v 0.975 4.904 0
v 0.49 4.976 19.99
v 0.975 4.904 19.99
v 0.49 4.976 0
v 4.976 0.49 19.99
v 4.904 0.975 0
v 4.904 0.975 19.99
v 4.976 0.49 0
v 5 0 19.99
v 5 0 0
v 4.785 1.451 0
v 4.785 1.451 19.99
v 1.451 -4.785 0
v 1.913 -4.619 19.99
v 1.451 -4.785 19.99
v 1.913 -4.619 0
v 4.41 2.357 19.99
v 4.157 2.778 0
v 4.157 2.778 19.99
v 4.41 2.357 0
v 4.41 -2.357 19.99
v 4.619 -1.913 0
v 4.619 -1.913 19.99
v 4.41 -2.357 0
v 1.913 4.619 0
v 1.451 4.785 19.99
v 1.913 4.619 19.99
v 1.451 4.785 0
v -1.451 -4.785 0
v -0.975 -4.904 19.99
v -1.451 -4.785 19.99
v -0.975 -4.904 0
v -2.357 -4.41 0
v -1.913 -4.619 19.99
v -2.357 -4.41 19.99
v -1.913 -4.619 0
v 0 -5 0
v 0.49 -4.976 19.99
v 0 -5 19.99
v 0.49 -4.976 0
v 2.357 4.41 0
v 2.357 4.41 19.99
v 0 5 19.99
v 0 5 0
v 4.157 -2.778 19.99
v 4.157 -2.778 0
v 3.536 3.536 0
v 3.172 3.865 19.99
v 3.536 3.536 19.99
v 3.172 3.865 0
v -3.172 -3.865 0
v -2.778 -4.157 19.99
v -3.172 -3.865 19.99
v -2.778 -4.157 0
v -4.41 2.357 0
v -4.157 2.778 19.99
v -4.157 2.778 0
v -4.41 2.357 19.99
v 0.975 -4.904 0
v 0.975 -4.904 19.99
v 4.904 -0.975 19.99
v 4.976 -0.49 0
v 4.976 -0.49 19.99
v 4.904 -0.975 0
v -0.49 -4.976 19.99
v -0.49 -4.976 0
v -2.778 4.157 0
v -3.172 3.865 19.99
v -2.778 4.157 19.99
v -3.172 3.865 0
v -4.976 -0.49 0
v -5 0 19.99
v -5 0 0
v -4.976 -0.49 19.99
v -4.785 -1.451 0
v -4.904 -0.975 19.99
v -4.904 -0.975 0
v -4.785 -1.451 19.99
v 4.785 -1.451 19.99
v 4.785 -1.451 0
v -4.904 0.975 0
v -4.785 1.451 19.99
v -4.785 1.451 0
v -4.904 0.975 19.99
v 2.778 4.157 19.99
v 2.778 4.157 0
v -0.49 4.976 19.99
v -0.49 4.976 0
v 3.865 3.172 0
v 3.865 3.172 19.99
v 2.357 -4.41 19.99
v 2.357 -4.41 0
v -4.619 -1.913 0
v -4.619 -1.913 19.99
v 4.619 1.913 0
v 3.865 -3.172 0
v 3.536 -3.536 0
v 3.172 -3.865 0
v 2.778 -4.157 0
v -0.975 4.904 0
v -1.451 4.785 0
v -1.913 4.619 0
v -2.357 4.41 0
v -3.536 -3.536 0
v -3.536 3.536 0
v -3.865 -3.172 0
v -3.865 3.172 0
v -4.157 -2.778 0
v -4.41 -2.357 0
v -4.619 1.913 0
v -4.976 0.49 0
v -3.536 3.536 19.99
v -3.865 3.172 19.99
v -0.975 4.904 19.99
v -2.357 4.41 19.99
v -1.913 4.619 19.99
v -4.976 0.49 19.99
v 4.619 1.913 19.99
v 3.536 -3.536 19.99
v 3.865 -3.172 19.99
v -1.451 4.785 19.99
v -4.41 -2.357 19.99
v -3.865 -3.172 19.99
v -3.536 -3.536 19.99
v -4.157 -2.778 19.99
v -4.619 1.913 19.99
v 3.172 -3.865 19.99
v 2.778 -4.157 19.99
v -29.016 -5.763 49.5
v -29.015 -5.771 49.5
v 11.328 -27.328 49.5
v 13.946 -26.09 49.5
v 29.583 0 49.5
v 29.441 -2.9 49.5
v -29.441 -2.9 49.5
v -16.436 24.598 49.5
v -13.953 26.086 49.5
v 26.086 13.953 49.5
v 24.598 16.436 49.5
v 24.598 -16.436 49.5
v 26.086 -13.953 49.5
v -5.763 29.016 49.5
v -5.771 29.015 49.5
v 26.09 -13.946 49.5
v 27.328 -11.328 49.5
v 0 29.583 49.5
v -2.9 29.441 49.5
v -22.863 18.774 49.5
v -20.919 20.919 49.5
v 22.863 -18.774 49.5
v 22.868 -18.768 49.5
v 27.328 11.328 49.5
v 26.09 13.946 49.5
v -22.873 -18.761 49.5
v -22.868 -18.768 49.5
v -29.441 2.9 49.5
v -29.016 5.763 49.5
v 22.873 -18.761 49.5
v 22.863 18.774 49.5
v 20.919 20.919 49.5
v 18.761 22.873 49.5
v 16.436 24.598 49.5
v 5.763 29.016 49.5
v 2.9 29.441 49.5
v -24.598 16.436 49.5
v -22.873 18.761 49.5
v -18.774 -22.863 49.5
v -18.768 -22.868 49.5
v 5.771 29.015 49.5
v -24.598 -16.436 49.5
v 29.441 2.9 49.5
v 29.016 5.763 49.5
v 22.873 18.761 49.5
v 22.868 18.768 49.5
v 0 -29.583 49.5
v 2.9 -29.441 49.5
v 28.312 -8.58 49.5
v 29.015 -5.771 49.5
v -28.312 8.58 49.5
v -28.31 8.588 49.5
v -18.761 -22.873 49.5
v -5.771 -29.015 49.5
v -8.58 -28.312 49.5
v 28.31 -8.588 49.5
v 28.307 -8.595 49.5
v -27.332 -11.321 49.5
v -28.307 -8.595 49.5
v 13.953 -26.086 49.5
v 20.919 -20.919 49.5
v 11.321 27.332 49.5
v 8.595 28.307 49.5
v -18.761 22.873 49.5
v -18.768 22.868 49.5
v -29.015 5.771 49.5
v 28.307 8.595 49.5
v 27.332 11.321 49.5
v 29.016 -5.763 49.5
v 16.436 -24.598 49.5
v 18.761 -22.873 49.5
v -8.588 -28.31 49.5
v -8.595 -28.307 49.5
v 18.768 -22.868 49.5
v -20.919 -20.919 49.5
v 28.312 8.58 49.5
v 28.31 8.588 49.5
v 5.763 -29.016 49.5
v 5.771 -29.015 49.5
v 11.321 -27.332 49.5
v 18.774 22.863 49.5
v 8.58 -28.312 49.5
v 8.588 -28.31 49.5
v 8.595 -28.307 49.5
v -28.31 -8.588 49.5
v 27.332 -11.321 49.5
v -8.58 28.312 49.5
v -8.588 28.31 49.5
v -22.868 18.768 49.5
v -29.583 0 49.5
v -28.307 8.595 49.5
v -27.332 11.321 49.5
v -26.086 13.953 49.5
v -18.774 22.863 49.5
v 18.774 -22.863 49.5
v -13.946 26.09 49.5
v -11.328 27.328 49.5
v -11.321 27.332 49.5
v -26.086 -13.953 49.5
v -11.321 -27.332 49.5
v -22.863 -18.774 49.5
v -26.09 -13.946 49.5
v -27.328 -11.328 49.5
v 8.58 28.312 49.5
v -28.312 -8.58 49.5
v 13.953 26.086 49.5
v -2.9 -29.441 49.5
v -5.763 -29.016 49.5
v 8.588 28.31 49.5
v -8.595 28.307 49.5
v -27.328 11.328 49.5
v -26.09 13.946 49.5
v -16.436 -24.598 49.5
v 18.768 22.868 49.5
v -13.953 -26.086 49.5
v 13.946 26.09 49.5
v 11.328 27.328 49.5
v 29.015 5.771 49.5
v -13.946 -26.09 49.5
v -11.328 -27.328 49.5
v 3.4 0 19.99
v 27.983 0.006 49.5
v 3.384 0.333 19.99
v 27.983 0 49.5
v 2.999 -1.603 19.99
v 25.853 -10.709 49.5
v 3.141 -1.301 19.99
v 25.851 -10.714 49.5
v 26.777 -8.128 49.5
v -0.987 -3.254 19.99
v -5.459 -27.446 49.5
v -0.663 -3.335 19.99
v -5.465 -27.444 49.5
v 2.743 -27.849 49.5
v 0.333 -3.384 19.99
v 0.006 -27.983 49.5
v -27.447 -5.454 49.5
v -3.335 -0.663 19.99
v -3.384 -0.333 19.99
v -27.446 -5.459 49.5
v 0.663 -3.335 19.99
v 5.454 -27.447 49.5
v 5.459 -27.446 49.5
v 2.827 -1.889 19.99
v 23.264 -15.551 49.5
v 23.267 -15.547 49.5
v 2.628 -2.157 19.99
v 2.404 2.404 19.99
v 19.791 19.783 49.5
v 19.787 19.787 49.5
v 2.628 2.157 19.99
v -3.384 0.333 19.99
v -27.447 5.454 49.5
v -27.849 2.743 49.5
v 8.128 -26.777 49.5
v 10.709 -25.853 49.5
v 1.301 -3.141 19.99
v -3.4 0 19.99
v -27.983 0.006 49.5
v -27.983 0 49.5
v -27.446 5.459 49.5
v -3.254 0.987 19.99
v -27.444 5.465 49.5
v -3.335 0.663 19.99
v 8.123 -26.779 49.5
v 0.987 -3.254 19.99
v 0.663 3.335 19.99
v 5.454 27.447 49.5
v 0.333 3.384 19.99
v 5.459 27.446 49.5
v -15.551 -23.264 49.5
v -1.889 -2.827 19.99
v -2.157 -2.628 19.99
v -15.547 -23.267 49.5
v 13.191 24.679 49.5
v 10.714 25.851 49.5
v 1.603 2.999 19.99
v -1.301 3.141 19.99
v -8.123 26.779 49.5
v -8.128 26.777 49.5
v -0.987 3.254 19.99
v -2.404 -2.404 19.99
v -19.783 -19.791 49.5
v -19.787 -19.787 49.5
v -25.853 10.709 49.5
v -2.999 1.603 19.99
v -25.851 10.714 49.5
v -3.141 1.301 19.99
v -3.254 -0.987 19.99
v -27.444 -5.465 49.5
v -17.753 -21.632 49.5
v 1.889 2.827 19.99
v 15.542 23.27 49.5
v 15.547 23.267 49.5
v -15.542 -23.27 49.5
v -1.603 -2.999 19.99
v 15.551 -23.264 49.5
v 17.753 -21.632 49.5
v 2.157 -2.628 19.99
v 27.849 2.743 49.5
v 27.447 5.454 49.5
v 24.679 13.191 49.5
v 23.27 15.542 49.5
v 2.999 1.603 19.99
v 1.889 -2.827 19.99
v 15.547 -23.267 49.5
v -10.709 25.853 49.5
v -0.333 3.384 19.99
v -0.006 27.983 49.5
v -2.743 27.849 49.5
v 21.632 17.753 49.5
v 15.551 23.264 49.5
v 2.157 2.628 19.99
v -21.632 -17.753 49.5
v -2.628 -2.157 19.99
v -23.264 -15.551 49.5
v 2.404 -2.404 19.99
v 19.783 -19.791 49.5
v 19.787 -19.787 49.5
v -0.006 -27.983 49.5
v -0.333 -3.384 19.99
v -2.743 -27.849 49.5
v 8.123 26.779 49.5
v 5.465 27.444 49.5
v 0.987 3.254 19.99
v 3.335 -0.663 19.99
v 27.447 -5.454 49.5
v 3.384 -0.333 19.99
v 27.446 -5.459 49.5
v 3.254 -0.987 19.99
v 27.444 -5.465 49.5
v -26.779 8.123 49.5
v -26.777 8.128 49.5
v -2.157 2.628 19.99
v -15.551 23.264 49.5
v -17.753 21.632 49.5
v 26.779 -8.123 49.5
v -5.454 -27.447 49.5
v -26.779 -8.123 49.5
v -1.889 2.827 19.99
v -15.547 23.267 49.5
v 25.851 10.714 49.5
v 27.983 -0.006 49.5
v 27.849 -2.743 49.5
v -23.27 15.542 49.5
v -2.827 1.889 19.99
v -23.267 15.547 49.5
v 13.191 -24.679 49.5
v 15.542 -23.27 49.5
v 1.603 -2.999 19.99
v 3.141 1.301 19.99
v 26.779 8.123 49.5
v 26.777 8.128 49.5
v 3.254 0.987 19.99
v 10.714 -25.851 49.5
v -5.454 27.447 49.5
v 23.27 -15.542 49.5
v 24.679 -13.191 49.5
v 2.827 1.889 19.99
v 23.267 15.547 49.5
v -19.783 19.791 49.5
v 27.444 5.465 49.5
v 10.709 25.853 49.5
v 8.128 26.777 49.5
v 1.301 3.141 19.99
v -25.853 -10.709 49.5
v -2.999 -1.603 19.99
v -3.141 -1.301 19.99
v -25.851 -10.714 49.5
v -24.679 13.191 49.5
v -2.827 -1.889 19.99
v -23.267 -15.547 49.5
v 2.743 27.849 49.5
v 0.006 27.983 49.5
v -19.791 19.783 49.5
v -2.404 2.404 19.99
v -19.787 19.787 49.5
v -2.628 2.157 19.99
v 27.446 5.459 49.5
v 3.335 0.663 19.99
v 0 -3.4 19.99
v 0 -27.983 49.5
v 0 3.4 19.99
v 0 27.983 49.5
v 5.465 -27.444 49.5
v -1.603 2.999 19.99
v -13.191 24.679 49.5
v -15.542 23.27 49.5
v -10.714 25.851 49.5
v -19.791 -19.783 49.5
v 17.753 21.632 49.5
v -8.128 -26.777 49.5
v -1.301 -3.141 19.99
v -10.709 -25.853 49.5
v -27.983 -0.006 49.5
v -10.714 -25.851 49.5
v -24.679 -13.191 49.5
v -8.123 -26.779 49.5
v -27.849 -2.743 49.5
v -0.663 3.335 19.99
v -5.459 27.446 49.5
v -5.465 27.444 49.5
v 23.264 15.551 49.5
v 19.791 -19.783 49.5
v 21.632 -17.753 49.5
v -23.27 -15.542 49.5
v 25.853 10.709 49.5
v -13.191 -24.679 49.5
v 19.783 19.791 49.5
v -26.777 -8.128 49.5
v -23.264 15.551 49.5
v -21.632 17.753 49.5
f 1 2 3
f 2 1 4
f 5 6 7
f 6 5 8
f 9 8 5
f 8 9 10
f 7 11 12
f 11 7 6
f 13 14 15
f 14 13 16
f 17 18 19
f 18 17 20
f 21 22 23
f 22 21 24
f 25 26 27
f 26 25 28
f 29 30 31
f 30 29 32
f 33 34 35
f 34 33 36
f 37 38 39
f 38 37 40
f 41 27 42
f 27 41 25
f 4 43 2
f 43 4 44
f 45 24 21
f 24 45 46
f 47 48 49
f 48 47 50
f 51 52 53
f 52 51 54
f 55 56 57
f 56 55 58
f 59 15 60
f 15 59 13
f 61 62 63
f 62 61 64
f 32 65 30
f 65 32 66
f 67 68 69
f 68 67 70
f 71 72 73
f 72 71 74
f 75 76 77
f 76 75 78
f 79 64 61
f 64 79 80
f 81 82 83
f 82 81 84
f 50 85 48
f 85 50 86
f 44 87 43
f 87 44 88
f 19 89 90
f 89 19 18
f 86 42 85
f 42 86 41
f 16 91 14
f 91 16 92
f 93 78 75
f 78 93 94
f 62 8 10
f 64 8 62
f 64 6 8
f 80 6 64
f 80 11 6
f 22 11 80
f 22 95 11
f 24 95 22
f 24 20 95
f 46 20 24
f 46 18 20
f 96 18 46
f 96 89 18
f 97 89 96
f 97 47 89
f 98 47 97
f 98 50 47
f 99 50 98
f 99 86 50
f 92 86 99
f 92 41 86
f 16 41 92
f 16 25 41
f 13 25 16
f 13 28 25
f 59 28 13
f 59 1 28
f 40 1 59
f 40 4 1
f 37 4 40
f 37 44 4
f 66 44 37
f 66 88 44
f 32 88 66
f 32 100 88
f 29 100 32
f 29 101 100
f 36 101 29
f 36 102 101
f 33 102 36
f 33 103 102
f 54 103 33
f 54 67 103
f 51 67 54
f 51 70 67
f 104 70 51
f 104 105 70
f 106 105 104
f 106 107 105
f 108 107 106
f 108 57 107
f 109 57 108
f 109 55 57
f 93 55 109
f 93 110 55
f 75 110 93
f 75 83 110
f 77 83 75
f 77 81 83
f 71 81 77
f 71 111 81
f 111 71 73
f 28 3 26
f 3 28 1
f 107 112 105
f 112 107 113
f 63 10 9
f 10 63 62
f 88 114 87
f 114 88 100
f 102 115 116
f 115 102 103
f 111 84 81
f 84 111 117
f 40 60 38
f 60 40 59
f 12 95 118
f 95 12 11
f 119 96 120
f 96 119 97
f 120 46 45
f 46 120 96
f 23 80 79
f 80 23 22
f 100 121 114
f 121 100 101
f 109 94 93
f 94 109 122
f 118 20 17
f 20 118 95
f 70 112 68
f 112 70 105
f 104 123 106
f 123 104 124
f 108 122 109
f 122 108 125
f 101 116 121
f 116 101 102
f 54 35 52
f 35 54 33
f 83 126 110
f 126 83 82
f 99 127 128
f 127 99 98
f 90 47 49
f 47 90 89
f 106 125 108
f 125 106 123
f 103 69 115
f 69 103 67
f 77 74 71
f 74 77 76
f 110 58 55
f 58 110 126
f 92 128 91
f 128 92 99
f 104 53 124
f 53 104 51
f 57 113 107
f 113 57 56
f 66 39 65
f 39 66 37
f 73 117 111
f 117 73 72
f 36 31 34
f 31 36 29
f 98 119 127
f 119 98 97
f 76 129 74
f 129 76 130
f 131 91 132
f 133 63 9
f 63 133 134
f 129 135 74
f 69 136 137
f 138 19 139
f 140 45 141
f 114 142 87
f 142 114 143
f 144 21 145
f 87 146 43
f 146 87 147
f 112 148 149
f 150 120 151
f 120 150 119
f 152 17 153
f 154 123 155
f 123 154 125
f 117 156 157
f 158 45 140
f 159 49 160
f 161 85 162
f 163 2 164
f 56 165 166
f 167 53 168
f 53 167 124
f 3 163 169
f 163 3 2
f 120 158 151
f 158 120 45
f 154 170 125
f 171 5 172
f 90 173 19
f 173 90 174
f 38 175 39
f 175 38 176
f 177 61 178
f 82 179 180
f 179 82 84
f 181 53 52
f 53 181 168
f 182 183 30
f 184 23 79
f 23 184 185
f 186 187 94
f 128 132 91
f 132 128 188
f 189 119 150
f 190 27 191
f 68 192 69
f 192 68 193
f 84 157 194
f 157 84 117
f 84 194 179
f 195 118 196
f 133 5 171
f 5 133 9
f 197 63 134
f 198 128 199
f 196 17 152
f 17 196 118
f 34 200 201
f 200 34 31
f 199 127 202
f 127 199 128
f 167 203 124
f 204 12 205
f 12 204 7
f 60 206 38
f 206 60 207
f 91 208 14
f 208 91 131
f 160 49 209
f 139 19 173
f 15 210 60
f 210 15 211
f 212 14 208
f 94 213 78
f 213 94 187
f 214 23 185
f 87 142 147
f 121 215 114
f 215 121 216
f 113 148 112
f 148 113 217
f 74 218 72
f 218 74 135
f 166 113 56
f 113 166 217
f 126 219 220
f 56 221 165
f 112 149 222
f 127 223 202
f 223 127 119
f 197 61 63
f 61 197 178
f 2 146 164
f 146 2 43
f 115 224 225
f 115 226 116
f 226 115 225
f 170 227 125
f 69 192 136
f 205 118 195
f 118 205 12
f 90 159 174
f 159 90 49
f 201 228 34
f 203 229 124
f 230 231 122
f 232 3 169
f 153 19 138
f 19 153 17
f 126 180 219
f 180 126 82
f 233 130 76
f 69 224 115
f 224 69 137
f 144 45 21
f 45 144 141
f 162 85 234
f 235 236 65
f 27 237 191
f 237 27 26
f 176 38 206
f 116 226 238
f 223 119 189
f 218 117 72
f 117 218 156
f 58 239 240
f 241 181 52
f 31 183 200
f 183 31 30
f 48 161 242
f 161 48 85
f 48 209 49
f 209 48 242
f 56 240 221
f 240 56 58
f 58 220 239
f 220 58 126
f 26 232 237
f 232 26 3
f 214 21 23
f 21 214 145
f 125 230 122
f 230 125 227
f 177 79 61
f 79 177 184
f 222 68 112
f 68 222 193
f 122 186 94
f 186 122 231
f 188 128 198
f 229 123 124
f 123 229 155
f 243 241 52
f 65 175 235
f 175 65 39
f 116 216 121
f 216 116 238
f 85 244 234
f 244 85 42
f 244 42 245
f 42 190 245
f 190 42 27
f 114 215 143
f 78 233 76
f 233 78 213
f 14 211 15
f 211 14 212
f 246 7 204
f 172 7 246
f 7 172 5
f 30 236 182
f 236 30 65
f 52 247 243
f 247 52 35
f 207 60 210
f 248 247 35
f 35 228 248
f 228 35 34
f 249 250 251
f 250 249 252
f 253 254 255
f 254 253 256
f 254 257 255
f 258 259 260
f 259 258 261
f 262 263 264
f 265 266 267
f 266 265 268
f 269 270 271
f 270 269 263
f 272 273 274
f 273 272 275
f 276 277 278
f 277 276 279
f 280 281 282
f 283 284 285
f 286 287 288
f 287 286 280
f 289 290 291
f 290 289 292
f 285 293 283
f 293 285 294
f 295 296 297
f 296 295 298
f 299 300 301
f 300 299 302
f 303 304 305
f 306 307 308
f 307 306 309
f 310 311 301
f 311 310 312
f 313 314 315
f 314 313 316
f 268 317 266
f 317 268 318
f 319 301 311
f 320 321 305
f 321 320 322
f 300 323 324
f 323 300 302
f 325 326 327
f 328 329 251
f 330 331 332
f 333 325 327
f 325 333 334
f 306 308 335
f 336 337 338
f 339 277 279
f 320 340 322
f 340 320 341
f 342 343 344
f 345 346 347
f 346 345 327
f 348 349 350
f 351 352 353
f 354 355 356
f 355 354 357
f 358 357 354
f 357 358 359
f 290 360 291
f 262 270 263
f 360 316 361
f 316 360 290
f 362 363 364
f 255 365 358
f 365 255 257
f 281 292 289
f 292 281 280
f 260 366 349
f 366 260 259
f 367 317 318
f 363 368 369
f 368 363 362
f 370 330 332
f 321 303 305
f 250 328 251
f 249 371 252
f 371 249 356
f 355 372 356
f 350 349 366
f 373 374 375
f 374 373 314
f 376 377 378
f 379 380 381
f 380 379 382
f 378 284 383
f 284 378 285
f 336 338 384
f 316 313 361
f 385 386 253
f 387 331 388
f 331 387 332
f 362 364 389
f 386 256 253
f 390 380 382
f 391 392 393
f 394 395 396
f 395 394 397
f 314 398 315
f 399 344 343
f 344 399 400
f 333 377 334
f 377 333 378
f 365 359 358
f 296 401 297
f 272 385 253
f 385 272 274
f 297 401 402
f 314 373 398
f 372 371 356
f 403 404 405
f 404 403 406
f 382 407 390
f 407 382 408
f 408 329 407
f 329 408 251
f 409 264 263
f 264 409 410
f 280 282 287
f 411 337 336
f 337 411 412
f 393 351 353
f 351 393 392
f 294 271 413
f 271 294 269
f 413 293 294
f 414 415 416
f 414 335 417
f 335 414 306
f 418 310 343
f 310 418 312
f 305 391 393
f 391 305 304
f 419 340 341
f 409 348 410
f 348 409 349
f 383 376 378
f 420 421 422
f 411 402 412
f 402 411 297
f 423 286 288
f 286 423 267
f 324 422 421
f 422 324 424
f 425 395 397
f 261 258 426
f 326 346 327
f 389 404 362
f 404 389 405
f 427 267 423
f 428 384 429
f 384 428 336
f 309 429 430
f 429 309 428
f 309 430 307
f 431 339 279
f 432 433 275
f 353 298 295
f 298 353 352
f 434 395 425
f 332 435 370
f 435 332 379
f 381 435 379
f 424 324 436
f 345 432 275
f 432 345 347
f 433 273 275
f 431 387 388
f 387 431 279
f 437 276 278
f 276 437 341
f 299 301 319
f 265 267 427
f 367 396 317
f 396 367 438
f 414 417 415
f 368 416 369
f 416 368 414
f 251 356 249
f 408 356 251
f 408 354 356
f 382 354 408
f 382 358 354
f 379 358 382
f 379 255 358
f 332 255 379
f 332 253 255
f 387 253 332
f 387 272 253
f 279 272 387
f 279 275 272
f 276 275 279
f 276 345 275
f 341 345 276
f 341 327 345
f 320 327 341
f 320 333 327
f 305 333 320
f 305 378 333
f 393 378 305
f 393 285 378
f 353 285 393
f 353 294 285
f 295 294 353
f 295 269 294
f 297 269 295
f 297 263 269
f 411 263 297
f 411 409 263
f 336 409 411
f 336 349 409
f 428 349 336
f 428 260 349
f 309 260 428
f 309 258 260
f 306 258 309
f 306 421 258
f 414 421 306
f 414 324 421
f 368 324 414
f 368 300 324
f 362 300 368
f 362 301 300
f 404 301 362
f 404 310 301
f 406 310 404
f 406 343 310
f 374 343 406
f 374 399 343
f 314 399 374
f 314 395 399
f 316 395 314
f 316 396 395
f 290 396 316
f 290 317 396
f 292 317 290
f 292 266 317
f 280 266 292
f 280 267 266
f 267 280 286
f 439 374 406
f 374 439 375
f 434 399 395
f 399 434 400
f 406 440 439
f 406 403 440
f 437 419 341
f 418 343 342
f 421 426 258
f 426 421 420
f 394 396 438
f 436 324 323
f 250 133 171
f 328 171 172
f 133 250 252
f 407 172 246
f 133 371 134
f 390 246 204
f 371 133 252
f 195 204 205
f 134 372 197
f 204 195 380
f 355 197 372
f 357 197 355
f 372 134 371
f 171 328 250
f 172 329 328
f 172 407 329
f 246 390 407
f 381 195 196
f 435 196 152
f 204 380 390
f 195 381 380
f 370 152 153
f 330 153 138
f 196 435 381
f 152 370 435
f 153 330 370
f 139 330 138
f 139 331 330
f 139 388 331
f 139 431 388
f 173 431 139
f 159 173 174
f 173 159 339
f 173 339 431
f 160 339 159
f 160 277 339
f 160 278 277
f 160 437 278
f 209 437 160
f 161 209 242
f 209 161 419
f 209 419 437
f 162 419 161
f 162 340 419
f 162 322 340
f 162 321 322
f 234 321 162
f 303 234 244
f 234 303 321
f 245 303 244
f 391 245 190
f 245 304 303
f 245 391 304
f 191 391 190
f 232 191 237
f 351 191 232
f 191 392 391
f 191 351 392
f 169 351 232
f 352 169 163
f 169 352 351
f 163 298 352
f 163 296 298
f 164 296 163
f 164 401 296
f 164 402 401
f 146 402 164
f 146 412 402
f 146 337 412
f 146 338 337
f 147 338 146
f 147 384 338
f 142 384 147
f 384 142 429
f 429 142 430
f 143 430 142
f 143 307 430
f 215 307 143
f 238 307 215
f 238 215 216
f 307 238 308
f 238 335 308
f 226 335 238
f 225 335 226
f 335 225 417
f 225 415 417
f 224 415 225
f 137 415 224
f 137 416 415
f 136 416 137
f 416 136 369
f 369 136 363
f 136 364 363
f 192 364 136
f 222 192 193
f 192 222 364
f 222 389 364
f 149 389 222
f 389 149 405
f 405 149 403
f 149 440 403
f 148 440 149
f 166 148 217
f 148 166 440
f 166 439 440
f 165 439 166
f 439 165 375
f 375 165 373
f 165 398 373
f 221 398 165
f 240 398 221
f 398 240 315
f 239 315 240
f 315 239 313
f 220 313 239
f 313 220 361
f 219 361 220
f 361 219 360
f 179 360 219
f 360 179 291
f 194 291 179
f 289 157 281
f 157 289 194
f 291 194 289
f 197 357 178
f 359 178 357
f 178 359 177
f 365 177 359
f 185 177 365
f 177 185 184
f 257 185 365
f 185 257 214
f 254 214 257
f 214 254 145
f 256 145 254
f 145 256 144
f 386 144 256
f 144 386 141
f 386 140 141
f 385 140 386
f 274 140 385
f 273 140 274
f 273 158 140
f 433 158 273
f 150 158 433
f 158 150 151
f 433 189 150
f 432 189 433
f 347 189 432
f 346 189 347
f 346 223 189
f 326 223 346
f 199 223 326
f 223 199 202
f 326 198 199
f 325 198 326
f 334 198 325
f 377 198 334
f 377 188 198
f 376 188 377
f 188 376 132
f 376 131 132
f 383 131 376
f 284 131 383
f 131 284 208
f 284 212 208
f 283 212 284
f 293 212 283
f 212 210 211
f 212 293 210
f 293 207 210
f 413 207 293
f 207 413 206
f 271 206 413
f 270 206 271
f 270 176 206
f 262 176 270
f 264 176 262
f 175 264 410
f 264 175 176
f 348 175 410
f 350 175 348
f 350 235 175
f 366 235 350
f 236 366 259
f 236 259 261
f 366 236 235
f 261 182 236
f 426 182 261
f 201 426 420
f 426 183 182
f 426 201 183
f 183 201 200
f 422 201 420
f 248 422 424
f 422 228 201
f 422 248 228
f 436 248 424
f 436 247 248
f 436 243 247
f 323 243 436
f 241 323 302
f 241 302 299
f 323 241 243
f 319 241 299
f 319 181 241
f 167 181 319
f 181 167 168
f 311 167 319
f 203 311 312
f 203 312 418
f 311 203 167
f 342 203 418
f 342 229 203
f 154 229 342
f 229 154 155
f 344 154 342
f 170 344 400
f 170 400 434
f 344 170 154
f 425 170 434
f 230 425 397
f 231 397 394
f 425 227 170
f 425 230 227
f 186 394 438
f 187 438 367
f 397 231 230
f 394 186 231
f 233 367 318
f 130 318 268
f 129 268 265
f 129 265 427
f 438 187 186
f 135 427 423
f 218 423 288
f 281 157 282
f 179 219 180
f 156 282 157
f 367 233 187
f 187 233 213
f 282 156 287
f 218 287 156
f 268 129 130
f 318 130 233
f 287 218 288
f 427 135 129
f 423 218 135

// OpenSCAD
// Small lab funnel, printed upright with wide opening at top
// Units: mm

$fn = 64;

// --- Dimensions ---
spout_od      = 10;    // spout outer diameter
spout_id      = 6.8;  // spout bore diameter
spout_h       = 20;    // spout height (z = 0 to 20)
cone_top_d    = 10;    // cone diameter at spout junction (z = 20)
cone_rim_d    = 60;    // cone rim diameter (z = 50)
cone_h        = 30;    // cone height (z = 20 to 50)
wall          = 1.6;   // wall thickness everywhere

eps           = 0.5;   // overshoot for clean cuts

// --- Model ---
difference() {
    union() {
        // Spout
        cylinder(d = spout_od, h = spout_h);
        // Cone (slight overlap with spout for a clean union)
        translate([0, 0, spout_h - 0.01])
            cylinder(d1 = cone_top_d, d2 = cone_rim_d, h = cone_h + 0.01);
    }
    // Through-bore: spout bore up to junction, then cone bore
    translate([0, 0, spout_h - 0.01])
        cylinder(d1 = spout_id, d2 = cone_rim_d - 2 * wall, h = cone_h + 0.01);
    // Open rim cutter
    translate([0, 0, spout_h + cone_h - eps])
        cylinder(d = cone_rim_d + 2 * eps);
}
